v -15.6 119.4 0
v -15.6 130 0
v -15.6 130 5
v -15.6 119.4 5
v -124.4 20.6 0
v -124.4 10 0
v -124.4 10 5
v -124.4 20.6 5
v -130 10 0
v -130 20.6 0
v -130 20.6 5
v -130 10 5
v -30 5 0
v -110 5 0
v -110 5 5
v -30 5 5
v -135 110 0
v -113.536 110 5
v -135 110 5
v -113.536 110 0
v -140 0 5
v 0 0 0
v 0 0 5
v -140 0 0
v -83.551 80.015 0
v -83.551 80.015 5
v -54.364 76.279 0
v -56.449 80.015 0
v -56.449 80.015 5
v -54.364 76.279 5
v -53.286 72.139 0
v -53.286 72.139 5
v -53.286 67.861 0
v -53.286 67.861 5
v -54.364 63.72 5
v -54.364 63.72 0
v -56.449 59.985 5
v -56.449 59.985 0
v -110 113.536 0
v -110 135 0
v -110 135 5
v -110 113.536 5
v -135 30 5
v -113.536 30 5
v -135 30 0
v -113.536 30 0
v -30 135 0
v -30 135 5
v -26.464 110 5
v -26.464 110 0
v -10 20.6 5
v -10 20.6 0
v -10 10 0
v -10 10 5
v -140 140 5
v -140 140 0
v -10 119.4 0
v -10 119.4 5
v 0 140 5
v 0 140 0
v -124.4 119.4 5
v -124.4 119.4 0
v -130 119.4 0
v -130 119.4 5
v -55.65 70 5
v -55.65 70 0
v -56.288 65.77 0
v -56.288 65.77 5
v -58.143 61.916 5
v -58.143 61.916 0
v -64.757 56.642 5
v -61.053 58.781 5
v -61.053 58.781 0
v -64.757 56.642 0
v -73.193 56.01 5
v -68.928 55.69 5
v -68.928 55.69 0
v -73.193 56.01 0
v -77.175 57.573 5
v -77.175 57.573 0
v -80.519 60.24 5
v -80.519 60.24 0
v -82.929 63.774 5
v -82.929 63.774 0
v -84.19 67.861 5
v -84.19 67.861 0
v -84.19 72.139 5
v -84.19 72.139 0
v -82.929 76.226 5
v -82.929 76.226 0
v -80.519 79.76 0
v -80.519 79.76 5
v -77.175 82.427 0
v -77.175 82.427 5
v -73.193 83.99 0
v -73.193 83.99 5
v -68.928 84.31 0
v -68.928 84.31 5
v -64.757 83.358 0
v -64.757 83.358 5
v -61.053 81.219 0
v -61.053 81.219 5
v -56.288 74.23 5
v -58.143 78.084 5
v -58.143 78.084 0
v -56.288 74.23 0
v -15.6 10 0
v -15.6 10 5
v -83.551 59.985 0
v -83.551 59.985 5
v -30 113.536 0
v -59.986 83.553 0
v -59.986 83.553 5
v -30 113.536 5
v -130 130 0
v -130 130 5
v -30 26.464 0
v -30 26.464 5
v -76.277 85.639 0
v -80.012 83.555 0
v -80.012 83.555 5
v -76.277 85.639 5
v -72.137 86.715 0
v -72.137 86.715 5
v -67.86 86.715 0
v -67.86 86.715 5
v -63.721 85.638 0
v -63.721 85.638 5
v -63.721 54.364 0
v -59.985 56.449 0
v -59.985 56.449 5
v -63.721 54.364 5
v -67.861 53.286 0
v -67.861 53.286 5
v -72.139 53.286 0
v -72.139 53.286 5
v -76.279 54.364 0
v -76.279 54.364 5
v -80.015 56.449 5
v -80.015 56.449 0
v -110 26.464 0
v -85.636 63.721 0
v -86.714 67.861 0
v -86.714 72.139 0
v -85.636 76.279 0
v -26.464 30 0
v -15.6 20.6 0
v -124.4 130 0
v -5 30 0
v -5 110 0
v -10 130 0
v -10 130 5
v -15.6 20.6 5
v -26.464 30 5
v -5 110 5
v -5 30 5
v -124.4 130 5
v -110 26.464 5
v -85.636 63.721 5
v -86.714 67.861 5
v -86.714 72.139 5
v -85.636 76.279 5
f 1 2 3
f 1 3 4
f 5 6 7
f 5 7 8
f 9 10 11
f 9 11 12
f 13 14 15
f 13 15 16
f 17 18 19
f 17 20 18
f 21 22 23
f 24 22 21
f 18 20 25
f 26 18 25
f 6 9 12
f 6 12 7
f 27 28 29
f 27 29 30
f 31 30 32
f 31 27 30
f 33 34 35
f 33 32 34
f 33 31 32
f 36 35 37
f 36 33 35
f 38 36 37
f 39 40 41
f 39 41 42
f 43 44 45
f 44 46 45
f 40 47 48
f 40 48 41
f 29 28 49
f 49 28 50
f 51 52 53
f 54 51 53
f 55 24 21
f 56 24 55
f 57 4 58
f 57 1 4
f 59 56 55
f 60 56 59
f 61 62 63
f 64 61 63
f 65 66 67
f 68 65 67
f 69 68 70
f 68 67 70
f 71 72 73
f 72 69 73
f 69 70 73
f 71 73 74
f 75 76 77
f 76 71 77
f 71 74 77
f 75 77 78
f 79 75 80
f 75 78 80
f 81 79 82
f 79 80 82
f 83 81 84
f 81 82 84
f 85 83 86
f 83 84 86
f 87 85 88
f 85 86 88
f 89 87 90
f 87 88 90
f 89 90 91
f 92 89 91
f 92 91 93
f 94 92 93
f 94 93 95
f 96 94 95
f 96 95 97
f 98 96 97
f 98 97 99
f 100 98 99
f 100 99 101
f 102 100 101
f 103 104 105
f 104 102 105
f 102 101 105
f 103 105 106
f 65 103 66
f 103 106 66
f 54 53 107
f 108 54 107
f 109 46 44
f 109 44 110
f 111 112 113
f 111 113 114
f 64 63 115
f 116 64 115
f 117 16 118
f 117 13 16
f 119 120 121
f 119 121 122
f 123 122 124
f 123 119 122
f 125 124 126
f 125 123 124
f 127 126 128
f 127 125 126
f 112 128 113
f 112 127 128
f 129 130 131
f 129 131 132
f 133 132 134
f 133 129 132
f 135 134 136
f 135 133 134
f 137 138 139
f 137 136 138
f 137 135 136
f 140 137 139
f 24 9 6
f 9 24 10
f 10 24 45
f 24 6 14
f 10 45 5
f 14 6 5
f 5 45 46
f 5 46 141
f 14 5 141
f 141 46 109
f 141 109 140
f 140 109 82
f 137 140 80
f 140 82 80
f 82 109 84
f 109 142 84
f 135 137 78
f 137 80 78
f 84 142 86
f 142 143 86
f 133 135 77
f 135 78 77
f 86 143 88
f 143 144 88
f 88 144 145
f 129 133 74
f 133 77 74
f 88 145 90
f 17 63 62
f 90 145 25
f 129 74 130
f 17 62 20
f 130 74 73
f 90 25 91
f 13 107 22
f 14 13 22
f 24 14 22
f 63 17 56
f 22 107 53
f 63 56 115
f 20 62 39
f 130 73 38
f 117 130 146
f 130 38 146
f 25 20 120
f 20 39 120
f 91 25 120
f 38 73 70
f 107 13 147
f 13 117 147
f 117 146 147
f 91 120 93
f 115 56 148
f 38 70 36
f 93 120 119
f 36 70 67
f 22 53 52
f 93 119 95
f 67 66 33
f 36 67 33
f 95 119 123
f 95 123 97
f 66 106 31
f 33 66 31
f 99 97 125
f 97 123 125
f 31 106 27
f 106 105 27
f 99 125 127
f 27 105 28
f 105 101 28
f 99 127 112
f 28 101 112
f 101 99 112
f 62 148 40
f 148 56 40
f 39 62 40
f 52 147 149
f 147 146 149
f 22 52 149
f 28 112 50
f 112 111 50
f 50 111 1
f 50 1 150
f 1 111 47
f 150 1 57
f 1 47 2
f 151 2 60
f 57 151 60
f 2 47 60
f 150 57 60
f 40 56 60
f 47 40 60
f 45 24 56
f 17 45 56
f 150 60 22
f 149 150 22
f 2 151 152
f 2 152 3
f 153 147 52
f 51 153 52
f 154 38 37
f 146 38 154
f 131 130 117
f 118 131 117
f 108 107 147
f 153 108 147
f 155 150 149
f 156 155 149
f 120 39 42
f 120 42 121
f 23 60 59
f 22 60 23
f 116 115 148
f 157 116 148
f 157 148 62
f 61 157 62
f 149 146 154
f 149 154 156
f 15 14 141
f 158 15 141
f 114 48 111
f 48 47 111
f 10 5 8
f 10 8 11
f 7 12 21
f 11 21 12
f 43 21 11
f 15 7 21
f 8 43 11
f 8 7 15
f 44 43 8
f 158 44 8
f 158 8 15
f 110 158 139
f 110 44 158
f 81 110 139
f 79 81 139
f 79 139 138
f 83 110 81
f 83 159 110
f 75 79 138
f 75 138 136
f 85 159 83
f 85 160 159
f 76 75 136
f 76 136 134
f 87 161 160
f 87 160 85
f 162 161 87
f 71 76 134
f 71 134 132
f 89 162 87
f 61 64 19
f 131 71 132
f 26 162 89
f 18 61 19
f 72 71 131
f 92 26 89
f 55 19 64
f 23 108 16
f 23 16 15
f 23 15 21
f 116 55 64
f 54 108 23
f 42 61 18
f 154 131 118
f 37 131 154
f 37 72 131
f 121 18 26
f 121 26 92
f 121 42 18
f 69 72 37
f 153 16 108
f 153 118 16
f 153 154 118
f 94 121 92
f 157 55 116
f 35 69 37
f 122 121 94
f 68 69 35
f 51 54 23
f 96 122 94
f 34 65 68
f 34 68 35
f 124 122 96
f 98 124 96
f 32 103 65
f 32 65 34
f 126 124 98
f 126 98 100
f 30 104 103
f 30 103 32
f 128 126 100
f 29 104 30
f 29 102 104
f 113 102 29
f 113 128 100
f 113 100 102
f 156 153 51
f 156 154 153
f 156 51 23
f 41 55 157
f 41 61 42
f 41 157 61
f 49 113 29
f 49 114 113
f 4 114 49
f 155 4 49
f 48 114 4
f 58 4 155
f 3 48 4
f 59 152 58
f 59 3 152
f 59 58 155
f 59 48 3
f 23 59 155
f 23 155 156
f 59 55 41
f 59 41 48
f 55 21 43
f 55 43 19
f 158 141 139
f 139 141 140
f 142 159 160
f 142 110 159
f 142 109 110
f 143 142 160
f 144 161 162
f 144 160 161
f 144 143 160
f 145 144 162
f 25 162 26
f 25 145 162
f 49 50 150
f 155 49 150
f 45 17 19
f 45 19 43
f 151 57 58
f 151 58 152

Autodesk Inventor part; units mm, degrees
ref_plane "YZ Plane" through (0, 0, 0) normal (1, 0, 0) x (0, 1, 0)
ref_plane "XZ Plane" through (0, 0, 0) normal (0, 1, 0) x (-1, 0, 0)
ref_plane "XY Plane" through (0, 0, 0) normal (0, 0, 1) x (1, 0, 0)
sketch "Sketch1" plane through (0, 0, 0) normal (0, 0, 1) x (1, 0, 0)
  line L0 (0, 0) -> (-140, 0)
  line L1 (-140, 0) -> (-140, 140)
  line L2 (-140, 140) -> (0, 140)
  line L3 (0, 140) -> (0, 0)
  circle A0 centre (-70, 70) radius 14.35
  line L4 (-130, 124.4) -> (-130, 130)
  line L5 (-10, 124.4) -> (-10, 130)
  line L6 (-10, 15.6) -> (-10, 10)
  line L7 (-130, 15.6) -> (-130, 10)
  line L8 (-140, 140) -> (-110, 140)
  line L9 (-110.0005, 135.0005) -> (-110.0005, 113.536)
  line L10 (-113.536, 110) -> (-135, 110)
  line L11 (-140, 110) -> (-140, 140)
  line L12 (-140, 0) -> (-110, 0)
  line L13 (-109.9998, 5.0002) -> (-109.9998, 26.4642)
  line L14 (-113.536, 30) -> (-135, 30)
  line L15 (-140, 30) -> (-140, 0)
  line L16 (0, 0) -> (-30, 0)
  line L17 (-30, 5.0002) -> (-30, 26.464)
  line L18 (-26.4645, 30) -> (-5, 30)
  line L19 (0, 30) -> (0, 0)
  line L20 (0, 140) -> (-30, 140)
  line L21 (-30, 135.0005) -> (-30, 113.536)
  line L22 (-26.4638, 110.0002) -> (-5, 110.0002)
  line L23 (0, 110) -> (0, 140)
  line L24 (-110.0005, 113.536) -> (-80.0116, 83.5551)
  line L25 (-56.4494, 59.9849) -> (-26.4645, 30)
  line L26 (-113.536, 110) -> (-83.5508, 80.0148)
  line L27 (-59.9852, 56.4492) -> (-30, 26.464)
  line L28 (-113.536, 30) -> (-83.5508, 59.9852)
  line L29 (-59.9861, 83.5534) -> (-29.9997, 113.5363)
  line L30 (-109.9998, 26.4642) -> (-80.0148, 56.4492)
  line L31 (-56.4492, 80.0148) -> (-26.4638, 110.0002)
  line L32 (-135, 110) -> (-135, 30)
  line L33 (-140, 30) -> (-140, 110)
  line L34 (-5, 110.0002) -> (-5, 30)
  line L35 (0, 30) -> (0, 110)
  line L36 (-110, 140) -> (-30, 140)
  line L37 (-30, 135.0005) -> (-110.0005, 135.0005)
  line L38 (-30, 0) -> (-110, 0)
  line L39 (-109.9998, 5.0002) -> (-30, 5.0002)
  arc A1 (-83.5508, 80.0148) -> (-83.5508, 59.9852) centre (-70, 70) ccw
  arc A2 (-59.9861, 83.5534) -> (-80.0116, 83.5551) centre (-70, 70) ccw
  arc A3 (-80.0148, 56.4492) -> (-59.9852, 56.4492) centre (-70, 70) ccw
  arc A4 (-56.4494, 59.9849) -> (-56.4492, 80.0148) centre (-70, 70) ccw
  line L40 (-130, 130) -> (-124.4, 130)
  line L41 (-124.4, 130) -> (-124.4, 119.4)
  line L42 (-124.4, 119.4) -> (-130, 119.4)
  line L43 (-130, 119.4) -> (-130, 130)
  line L44 (-130, 10) -> (-124.4, 10)
  line L45 (-124.4, 10) -> (-124.4, 20.6)
  line L46 (-124.4, 20.6) -> (-130, 20.6)
  line L47 (-130, 20.6) -> (-130, 10)
  line L48 (-10, 10) -> (-15.6, 10)
  line L49 (-15.6, 10) -> (-15.6, 20.6)
  line L50 (-15.6, 20.6) -> (-10, 20.6)
  line L51 (-10, 20.6) -> (-10, 10)
  line L52 (-10, 130) -> (-15.6, 130)
  line L53 (-15.6, 130) -> (-15.6, 119.4)
  line L54 (-15.6, 119.4) -> (-10, 119.4)
  line L55 (-10, 119.4) -> (-10, 130)
  line L56 (-113.536, 30) -> (-109.9998, 26.4642)
  line L57 (-30, 26.464) -> (-26.4645, 30)
  line L58 (-30, 113.536) -> (-26.4638, 110.0002)
  line L59 (-110.0005, 113.536) -> (-113.536, 110)
  point P0 (-110, 113.5355)
  point P1 (-110, 26.464)
  point P2 (-26.464, 110)
extrude "Extrusion2" add sketch "Sketch1" along normal blind 5 contours L0 L1 L2 L3 | L24 A2 L29 L58 L31 A4 L25 L57 L27 A3 L30 L56 L28 A1 L26 L59
properties part number "Joints_Remake_TestFit_V1"
